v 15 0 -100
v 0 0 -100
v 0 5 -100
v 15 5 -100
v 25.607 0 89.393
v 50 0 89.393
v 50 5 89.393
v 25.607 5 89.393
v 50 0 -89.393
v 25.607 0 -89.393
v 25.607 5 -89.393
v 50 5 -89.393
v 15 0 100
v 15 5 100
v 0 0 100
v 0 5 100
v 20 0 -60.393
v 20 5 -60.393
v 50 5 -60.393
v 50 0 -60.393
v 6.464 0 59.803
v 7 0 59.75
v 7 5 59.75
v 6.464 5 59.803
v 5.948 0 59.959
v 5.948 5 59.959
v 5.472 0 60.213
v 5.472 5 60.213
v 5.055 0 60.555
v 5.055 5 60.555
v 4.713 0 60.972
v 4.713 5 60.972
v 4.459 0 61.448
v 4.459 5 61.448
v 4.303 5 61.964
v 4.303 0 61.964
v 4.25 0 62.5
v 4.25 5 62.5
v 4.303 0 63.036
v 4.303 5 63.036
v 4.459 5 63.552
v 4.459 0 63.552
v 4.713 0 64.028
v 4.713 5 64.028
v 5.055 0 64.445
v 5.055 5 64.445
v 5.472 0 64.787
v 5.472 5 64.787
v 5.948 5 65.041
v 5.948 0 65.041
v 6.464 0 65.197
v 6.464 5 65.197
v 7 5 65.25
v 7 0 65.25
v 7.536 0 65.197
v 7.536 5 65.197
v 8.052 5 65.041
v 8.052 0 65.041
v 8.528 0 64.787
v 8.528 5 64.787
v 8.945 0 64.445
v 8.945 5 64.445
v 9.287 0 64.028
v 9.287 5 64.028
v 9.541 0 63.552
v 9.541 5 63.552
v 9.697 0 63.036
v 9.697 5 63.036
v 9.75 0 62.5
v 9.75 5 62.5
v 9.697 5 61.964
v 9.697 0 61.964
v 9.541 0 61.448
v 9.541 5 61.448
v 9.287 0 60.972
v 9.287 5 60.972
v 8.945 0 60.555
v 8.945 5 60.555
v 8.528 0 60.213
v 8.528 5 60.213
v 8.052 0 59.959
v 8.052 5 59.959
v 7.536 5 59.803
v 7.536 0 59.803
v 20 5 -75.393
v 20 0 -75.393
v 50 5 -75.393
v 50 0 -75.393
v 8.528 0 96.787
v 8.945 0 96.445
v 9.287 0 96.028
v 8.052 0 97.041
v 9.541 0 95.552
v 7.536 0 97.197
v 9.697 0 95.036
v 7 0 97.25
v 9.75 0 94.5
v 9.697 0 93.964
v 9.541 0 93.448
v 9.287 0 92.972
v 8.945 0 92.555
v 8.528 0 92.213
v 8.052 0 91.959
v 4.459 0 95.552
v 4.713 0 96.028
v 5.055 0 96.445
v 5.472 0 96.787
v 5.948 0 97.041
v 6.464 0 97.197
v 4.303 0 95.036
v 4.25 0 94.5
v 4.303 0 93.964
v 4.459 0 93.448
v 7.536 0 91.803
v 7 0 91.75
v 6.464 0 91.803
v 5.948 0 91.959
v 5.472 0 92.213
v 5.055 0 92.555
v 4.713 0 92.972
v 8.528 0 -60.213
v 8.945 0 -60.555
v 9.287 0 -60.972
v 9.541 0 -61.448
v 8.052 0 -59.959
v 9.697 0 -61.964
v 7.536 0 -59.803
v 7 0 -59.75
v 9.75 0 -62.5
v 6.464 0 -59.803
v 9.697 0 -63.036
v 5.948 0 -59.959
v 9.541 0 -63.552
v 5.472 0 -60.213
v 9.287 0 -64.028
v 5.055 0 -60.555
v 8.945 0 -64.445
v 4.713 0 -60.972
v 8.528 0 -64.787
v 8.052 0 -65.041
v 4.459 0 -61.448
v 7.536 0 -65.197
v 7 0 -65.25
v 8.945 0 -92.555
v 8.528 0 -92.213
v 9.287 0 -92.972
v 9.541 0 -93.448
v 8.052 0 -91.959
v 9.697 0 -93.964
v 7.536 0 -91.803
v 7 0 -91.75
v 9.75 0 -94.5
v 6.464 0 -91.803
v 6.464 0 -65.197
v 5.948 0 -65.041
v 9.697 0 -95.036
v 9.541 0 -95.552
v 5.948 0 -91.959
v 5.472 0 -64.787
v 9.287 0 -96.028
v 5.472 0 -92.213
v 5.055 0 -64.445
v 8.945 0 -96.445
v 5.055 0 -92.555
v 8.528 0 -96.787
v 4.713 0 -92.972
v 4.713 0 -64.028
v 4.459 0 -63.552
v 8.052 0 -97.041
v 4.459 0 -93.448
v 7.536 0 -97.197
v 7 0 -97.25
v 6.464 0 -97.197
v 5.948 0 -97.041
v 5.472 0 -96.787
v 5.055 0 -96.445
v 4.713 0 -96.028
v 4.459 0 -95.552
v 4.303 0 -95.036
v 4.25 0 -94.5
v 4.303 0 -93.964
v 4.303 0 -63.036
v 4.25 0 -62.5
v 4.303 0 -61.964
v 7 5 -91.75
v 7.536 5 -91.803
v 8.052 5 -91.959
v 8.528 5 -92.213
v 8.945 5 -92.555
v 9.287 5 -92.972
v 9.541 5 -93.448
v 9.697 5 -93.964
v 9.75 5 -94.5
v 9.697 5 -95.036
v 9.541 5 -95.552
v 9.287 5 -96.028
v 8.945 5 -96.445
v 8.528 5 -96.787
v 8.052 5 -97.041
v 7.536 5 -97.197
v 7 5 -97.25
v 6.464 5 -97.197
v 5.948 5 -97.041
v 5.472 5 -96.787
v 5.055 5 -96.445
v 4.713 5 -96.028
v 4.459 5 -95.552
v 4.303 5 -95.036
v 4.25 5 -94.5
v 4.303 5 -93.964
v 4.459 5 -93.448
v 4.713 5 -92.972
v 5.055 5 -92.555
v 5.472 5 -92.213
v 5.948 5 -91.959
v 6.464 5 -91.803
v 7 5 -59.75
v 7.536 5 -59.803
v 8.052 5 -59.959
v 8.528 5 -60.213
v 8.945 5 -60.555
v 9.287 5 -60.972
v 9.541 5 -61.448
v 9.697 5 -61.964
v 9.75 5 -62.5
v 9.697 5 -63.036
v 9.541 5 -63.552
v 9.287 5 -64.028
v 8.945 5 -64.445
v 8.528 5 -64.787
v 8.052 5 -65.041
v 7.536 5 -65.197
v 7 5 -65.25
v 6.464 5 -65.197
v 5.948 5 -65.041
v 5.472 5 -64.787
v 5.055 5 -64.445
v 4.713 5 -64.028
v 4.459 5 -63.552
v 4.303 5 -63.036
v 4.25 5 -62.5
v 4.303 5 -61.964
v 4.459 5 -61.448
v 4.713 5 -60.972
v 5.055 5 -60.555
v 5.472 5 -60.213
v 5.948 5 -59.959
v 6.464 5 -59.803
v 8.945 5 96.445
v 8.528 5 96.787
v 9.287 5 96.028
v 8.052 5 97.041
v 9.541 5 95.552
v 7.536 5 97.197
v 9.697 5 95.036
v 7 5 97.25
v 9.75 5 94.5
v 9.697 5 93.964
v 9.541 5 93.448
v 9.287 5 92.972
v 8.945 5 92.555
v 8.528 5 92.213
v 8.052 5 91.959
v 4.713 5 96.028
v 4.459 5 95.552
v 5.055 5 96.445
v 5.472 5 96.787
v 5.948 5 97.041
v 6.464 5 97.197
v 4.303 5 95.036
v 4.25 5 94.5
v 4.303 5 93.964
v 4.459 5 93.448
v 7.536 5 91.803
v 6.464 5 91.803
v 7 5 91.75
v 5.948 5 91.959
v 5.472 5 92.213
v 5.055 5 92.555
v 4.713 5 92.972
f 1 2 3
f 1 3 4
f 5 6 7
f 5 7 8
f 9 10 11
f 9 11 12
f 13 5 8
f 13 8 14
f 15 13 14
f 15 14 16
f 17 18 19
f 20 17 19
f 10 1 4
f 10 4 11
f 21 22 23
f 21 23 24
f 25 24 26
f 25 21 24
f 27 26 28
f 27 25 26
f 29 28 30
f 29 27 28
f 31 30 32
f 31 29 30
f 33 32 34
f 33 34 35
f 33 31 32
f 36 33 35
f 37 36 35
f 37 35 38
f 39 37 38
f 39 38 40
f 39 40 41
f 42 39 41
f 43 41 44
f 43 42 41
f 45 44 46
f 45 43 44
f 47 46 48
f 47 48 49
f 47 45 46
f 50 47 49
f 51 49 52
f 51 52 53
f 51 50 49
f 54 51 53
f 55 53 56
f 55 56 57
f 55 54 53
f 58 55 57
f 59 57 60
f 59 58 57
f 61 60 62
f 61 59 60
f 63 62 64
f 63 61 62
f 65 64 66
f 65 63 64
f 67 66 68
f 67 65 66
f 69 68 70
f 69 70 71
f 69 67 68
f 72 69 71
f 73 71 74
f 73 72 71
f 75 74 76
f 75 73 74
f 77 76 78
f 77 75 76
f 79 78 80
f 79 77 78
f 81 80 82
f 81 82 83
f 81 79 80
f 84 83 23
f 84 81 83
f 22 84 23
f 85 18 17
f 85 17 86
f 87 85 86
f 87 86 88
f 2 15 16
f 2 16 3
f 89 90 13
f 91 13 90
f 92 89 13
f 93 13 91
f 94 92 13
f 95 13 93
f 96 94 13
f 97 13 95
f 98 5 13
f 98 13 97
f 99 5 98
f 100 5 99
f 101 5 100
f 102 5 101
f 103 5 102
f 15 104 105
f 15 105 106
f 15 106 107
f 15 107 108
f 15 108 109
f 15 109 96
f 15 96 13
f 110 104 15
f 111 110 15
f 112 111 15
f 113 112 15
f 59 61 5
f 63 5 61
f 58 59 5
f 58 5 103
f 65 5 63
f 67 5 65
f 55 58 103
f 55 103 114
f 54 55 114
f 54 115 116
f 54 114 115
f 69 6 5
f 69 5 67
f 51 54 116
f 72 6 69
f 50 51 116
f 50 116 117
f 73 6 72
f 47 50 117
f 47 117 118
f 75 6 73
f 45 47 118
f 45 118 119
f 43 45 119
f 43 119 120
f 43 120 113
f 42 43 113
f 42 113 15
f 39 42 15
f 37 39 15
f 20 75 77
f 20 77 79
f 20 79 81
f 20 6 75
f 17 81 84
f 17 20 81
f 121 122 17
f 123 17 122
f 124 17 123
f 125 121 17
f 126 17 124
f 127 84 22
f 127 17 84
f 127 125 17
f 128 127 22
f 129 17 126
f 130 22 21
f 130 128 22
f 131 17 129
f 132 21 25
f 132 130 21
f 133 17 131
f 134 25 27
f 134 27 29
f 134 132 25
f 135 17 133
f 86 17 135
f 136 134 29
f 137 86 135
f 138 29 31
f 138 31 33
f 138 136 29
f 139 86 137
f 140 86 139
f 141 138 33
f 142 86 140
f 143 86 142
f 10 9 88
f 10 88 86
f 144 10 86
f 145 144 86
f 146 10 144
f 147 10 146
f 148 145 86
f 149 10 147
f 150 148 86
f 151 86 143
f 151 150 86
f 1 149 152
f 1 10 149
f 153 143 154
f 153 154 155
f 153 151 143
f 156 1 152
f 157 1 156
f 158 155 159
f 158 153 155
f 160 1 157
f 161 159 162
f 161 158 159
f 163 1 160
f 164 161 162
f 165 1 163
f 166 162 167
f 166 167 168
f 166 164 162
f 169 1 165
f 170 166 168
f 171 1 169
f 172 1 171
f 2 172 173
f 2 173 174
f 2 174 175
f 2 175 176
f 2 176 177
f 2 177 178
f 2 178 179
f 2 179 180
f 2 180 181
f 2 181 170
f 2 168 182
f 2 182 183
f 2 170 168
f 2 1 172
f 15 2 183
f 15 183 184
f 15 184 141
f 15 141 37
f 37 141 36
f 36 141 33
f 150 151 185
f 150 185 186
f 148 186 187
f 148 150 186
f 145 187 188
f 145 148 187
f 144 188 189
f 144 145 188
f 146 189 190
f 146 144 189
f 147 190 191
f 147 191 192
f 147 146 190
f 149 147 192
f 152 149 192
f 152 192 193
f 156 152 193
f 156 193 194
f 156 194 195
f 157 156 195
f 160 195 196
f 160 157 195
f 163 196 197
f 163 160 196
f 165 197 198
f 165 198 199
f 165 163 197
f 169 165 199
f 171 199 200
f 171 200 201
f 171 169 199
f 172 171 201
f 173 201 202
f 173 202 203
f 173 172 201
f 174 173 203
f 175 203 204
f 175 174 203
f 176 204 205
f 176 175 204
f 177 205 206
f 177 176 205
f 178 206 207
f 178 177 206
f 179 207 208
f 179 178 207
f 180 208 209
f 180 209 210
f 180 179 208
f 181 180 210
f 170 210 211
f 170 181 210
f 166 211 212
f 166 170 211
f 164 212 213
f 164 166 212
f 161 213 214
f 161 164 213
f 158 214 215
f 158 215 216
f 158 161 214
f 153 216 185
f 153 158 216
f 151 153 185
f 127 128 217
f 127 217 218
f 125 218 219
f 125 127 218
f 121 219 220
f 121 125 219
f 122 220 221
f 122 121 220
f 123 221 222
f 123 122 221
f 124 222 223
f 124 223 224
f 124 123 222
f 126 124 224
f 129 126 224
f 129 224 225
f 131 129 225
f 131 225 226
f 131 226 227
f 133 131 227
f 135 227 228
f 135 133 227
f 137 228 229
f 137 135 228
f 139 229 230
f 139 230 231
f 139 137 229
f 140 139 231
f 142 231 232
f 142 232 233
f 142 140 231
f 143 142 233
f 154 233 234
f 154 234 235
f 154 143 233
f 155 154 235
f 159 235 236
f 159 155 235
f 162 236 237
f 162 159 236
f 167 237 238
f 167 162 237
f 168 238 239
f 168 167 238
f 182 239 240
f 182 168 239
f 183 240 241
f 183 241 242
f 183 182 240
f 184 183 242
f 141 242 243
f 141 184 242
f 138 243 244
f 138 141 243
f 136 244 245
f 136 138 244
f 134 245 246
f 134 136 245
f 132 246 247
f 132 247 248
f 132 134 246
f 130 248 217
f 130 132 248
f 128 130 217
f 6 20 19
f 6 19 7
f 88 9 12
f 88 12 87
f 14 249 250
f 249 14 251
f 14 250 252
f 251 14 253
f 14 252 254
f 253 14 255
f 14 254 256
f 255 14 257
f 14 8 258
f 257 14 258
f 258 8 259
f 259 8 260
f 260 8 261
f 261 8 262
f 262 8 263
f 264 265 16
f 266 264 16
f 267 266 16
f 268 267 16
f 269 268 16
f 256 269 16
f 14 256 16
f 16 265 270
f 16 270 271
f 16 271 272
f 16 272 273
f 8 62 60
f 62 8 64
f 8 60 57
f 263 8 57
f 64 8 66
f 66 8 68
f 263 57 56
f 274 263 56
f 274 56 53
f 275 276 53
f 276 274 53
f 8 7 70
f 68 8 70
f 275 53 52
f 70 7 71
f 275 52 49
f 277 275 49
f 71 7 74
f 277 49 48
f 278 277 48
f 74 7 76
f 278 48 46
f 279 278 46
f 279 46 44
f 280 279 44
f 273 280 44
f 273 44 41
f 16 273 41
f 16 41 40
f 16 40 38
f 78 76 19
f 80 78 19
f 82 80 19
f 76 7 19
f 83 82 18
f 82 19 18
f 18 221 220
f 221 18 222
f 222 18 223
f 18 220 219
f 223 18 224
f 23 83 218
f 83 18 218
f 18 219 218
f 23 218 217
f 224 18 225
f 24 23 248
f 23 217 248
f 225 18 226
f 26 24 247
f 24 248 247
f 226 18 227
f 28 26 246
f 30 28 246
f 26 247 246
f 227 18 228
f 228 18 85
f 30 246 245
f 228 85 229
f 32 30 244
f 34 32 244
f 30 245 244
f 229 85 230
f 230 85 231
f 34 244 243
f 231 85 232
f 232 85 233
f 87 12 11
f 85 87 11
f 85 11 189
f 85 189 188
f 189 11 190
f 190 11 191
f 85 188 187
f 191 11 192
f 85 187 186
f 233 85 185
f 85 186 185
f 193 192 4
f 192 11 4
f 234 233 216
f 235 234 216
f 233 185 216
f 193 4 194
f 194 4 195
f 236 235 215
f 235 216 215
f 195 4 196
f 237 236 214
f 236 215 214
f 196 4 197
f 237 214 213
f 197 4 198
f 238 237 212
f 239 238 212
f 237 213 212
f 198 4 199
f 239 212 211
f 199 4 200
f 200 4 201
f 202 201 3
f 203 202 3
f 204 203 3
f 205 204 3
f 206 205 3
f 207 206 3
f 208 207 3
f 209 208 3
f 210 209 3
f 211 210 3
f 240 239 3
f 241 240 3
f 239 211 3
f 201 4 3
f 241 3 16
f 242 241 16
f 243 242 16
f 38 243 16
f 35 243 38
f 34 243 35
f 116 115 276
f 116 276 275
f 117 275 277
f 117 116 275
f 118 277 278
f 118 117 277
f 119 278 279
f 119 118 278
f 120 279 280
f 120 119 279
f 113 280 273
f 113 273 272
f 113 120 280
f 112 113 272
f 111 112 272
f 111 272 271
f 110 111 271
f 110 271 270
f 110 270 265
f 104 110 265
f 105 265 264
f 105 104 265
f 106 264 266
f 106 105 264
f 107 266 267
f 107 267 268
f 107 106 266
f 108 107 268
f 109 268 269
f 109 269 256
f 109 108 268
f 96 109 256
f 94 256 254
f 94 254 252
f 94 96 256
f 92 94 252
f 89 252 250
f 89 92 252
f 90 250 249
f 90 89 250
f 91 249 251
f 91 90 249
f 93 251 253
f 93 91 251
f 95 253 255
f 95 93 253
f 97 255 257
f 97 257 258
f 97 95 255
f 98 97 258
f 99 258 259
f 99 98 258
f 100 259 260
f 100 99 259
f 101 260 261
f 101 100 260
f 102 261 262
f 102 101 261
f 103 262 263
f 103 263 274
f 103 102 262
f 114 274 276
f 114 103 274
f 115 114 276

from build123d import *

# Parameters (mm, degrees)
ESQUISSE1_R             = 2.75
BOSS_EXTRU_1_DEPTH      = 5
ESQUISSE2_W             = 30
ESQUISSE2_H             = 15
ENL_V_MAT_EXTRU_1_DEPTH = 112.915146428


with BuildPart() as part:
    # Esquisse1 → Boss.-Extru.1 (new body)
    with BuildSketch(Plane(origin=(0, 0, 0), x_dir=(1, 0, 0), z_dir=(0, 1, 0))):
        Polygon((0, 100), (15, 100), (25.606601718, 89.393398282), (50, 89.393398282), (50, -89.393398282), (25.606601718, -89.393398282), (15, -100), (0, -100), align=None)
        with Locations(Location((7, 94.5, 0), (0, 0, 270))):
            Circle(ESQUISSE1_R, mode=Mode.SUBTRACT)
        with Locations(Location((7, 62.5, 0), (0, 0, 270))):
            Circle(ESQUISSE1_R, mode=Mode.SUBTRACT)
        with Locations(Location((7, -62.5, 0), (0, 0, 90))):
            Circle(ESQUISSE1_R, mode=Mode.SUBTRACT)
        with Locations(Location((7, -94.5, 0), (0, 0, 90))):
            Circle(ESQUISSE1_R, mode=Mode.SUBTRACT)
    extrude(amount=BOSS_EXTRU_1_DEPTH)

    # Esquisse2 → Enlèv. mat.-Extru.1 (cut, through all)
    with BuildSketch(Plane(origin=(0, 5, 0), x_dir=(1, 0, 0), z_dir=(0, 1, 0))):
        with Locations((35, 67.893398282)):
            Rectangle(ESQUISSE2_W, ESQUISSE2_H)
    extrude(amount=-ENL_V_MAT_EXTRU_1_DEPTH, mode=Mode.SUBTRACT)


solid = part.part
